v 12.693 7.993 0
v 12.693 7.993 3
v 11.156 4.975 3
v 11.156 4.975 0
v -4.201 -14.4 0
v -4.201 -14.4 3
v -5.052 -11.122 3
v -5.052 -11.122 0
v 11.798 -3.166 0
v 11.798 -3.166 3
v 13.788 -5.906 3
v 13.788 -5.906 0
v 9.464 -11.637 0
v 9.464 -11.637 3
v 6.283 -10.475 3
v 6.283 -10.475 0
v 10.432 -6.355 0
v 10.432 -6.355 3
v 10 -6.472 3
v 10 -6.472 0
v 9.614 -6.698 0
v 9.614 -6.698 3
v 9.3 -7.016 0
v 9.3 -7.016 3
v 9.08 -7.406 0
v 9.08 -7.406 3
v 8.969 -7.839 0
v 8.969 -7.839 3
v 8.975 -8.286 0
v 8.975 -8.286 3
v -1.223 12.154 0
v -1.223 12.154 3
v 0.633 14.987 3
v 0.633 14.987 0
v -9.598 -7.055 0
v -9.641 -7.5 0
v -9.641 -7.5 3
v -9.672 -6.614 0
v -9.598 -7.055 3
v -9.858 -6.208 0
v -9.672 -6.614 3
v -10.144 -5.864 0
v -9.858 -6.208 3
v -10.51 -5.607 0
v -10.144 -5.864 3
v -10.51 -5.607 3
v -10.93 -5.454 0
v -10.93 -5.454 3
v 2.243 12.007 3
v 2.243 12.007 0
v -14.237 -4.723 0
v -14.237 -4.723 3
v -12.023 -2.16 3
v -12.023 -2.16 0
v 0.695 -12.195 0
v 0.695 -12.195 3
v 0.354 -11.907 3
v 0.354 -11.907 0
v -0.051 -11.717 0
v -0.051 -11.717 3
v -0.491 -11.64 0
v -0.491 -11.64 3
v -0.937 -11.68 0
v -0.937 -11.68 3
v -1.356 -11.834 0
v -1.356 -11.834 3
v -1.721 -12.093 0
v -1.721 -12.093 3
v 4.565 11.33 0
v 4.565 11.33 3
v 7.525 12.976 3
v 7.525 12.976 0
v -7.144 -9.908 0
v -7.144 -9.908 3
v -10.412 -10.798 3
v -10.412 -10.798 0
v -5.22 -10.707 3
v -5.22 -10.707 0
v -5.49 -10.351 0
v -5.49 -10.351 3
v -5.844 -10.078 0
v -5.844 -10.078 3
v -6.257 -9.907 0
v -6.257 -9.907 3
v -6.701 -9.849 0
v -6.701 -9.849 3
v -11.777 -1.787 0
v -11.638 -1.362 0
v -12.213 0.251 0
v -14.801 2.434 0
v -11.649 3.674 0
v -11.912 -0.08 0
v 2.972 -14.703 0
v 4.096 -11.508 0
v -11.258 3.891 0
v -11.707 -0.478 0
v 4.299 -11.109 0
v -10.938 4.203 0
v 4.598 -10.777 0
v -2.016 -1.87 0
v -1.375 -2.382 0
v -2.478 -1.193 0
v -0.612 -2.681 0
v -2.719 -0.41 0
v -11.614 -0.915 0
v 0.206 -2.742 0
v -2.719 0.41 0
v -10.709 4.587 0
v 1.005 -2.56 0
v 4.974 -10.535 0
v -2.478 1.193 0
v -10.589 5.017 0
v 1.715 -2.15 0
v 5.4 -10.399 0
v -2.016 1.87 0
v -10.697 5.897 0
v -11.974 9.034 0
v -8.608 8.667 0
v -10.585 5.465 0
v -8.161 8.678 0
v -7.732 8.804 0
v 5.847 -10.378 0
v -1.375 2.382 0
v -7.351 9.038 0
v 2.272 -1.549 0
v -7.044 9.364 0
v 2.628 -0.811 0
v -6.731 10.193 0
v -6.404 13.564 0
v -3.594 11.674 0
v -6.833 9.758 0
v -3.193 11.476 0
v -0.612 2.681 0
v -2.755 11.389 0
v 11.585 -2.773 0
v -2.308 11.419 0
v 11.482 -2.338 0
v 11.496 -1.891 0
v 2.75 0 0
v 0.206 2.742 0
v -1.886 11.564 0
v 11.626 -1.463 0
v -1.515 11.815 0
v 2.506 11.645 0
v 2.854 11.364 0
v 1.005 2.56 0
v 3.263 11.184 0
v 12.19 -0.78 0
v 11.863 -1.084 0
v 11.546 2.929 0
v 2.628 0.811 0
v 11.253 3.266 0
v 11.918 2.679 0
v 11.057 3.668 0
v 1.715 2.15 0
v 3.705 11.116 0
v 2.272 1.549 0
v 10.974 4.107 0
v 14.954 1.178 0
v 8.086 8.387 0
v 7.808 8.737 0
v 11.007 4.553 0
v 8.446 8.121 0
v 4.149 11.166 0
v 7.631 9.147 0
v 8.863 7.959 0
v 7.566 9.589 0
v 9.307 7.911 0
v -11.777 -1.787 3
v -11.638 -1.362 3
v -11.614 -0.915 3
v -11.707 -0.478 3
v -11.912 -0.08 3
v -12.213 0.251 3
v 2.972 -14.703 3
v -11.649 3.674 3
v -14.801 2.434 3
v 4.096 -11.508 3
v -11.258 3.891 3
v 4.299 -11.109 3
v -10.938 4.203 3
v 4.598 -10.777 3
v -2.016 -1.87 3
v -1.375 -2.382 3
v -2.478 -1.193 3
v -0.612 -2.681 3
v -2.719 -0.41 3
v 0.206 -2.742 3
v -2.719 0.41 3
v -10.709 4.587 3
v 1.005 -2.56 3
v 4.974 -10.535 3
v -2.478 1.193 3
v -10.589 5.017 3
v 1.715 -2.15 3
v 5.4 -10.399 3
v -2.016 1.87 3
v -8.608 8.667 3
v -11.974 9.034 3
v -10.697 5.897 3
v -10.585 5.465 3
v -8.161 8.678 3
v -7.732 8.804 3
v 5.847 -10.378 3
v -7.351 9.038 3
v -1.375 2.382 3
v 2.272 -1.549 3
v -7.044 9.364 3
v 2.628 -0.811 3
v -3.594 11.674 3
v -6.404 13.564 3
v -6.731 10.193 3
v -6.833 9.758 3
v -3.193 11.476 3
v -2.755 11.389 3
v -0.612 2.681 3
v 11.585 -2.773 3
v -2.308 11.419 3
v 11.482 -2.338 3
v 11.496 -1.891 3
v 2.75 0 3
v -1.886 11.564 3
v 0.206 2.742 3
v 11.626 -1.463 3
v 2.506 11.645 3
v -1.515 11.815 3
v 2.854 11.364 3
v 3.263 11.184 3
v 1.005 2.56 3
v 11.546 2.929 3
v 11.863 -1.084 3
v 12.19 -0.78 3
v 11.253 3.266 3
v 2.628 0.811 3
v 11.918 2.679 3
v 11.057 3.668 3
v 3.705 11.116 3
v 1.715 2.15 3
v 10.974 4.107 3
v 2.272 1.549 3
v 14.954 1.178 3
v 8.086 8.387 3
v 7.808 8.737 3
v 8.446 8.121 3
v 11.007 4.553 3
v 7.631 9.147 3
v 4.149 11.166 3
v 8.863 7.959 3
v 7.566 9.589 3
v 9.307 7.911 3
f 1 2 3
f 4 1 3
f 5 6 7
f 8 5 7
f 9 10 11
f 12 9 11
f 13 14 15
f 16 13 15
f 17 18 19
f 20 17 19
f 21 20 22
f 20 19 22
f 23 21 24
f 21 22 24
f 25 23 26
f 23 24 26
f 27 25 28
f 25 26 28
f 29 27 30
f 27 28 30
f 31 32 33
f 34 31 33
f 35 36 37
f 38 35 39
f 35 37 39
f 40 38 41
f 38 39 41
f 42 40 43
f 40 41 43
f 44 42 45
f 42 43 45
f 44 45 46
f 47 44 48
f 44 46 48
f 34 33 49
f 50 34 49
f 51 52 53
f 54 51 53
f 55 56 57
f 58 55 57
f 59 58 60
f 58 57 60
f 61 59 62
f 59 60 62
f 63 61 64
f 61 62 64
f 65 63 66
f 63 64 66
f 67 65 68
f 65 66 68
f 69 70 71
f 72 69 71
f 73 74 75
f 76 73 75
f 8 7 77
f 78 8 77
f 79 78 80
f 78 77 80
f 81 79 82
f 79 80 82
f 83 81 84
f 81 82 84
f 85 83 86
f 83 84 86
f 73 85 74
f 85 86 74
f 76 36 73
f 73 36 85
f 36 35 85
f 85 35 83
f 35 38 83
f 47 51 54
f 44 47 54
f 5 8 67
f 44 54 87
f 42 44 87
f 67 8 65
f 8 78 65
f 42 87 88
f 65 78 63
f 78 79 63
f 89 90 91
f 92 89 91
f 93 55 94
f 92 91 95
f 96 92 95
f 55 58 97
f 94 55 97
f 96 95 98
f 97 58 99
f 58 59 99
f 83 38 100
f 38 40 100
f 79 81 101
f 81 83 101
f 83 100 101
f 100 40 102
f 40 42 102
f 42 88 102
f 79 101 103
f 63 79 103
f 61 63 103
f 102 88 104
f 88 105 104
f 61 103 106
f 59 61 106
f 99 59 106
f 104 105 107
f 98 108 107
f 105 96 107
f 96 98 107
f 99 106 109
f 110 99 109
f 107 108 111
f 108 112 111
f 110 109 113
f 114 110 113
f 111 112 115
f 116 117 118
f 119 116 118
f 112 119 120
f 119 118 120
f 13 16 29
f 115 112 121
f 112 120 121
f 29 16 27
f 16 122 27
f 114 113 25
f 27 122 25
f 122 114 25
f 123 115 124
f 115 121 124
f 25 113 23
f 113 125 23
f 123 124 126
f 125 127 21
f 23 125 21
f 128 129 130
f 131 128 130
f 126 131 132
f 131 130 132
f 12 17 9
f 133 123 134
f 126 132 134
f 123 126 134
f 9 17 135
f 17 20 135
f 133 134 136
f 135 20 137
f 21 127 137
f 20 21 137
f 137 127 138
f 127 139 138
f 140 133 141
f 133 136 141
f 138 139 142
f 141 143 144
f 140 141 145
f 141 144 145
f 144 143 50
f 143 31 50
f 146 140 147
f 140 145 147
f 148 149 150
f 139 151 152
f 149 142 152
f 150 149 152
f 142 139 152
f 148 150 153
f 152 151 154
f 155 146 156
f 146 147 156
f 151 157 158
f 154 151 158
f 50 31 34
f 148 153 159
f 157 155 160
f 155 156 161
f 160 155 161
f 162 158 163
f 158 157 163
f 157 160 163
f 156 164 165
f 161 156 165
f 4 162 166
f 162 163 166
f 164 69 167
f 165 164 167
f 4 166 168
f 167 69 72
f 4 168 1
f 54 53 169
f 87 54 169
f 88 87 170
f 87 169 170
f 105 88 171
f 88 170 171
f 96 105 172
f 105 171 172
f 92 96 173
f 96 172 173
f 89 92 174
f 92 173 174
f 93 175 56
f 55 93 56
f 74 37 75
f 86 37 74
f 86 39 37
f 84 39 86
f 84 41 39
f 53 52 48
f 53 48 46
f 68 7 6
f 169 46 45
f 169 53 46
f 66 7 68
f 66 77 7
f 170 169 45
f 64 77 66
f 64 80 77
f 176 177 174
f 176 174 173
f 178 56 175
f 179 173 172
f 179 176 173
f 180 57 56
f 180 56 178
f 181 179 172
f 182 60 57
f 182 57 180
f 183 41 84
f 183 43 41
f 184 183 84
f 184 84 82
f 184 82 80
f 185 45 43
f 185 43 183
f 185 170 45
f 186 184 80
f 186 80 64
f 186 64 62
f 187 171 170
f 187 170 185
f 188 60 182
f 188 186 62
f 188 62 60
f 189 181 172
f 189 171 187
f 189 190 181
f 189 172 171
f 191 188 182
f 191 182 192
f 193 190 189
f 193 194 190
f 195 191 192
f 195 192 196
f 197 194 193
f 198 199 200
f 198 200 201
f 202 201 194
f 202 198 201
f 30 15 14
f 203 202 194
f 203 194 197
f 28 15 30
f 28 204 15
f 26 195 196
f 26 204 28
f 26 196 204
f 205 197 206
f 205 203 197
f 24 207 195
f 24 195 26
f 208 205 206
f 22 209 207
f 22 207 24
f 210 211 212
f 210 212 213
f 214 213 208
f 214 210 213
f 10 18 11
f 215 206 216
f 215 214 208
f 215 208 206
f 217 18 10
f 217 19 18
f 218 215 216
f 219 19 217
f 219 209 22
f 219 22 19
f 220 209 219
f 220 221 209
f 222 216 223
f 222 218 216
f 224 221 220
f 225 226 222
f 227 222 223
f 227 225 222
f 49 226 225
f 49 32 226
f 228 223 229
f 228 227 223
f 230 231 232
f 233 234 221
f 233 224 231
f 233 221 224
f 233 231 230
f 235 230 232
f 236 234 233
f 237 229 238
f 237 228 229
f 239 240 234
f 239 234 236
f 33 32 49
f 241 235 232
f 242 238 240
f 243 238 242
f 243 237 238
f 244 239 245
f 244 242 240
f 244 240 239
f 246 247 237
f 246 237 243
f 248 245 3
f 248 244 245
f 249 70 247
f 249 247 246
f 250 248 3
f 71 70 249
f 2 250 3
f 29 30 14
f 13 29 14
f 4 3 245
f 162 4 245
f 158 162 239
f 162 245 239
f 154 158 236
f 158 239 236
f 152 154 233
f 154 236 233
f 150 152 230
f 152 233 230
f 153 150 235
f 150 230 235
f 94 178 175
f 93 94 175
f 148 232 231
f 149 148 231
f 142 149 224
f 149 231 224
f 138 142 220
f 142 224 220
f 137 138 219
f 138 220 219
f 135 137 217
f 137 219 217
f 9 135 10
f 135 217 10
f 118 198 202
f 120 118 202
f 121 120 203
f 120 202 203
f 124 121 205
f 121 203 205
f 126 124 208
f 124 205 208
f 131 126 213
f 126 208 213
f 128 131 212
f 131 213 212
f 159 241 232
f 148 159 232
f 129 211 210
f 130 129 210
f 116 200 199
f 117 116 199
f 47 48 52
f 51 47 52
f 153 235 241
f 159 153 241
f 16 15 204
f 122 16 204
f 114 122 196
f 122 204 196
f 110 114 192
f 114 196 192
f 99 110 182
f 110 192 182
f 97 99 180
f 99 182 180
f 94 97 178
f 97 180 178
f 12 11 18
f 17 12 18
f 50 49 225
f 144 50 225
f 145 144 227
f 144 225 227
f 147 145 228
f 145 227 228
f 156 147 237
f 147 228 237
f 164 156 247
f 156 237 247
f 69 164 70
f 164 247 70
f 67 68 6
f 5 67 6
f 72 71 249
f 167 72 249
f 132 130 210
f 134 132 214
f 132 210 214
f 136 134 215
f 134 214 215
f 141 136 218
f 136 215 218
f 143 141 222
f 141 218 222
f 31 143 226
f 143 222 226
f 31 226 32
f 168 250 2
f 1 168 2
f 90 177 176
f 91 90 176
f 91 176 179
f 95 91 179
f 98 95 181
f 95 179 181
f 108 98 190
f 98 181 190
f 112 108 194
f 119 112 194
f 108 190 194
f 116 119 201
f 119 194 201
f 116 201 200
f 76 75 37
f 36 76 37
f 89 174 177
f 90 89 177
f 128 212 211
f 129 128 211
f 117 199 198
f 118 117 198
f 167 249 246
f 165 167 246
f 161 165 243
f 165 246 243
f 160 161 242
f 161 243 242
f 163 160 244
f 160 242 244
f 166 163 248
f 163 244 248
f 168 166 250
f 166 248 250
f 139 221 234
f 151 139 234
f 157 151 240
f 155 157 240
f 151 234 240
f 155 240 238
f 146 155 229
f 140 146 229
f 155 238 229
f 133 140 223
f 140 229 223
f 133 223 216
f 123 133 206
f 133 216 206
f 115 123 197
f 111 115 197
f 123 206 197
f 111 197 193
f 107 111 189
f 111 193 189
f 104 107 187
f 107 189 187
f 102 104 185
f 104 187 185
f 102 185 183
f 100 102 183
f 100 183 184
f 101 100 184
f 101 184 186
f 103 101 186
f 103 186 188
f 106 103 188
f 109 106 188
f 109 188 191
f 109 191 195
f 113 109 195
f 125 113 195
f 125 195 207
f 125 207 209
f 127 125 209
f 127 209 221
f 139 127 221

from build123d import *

# Parameters (mm, degrees)
SKETCH1_R           = 15
BOSS_EXTRUDE1_DEPTH = 3
SKETCH2_R           = 2.75
CUT_EXTRUDE1_DEPTH  = 11
SKETCH3_R           = 1.7
CUT_EXTRUDE5_DEPTH  = 10
CIRPATTERN1_COUNT   = 13
CUT_EXTRUDE6_DEPTH  = 10
CIRPATTERN2_COUNT   = 13


with BuildPart() as part:
    # Sketch1 → Boss-Extrude1 (new body)
    with BuildSketch(Plane.XY):
        Circle(SKETCH1_R)
    extrude(amount=BOSS_EXTRUDE1_DEPTH)

    # Sketch2 → Cut-Extrude1 (cut)
    with BuildSketch(Plane.XY.offset(3)):
        Circle(SKETCH2_R)
    extrude(amount=-CUT_EXTRUDE1_DEPTH, mode=Mode.SUBTRACT)

    # Sketch3 → Cut-Extrude5 (cut)
    with BuildSketch(Plane.XY.offset(3)):
        with Locations((3.738719386, 12.815790157)):
            Circle(SKETCH3_R)
    cut_extrude5 = extrude(amount=-CUT_EXTRUDE5_DEPTH, mode=Mode.SUBTRACT)

    # CirPattern1: Cut-Extrude5 ×13 about axis
    cirpattern1_axis = Axis((0, 0, 0), (0, 0, 1))
    for i in range(1, CIRPATTERN1_COUNT):
        add(cut_extrude5.rotate(cirpattern1_axis, i * 360 / CIRPATTERN1_COUNT), mode=Mode.SUBTRACT)

    # Sketch4 → Cut-Extrude6 (cut)
    with BuildSketch(Plane.XY.offset(3)):
        Polygon((-1.22331177, 12.153685267), (0.632651304, 14.986652472), (2.243253238, 12.007346591), (4.816692291, 13.980883612), (-0.349444611, 17.339445828), (-3.866613741, 14.072309299), align=None)
    cut_extrude6 = extrude(amount=-CUT_EXTRUDE6_DEPTH, mode=Mode.SUBTRACT)

    # CirPattern2: Cut-Extrude6 ×13 about axis
    cirpattern2_axis = Axis((0, 0, 0), (0, 0, 1))
    for i in range(1, CIRPATTERN2_COUNT):
        add(cut_extrude6.rotate(cirpattern2_axis, i * 360 / CIRPATTERN2_COUNT), mode=Mode.SUBTRACT)


solid = part.part
